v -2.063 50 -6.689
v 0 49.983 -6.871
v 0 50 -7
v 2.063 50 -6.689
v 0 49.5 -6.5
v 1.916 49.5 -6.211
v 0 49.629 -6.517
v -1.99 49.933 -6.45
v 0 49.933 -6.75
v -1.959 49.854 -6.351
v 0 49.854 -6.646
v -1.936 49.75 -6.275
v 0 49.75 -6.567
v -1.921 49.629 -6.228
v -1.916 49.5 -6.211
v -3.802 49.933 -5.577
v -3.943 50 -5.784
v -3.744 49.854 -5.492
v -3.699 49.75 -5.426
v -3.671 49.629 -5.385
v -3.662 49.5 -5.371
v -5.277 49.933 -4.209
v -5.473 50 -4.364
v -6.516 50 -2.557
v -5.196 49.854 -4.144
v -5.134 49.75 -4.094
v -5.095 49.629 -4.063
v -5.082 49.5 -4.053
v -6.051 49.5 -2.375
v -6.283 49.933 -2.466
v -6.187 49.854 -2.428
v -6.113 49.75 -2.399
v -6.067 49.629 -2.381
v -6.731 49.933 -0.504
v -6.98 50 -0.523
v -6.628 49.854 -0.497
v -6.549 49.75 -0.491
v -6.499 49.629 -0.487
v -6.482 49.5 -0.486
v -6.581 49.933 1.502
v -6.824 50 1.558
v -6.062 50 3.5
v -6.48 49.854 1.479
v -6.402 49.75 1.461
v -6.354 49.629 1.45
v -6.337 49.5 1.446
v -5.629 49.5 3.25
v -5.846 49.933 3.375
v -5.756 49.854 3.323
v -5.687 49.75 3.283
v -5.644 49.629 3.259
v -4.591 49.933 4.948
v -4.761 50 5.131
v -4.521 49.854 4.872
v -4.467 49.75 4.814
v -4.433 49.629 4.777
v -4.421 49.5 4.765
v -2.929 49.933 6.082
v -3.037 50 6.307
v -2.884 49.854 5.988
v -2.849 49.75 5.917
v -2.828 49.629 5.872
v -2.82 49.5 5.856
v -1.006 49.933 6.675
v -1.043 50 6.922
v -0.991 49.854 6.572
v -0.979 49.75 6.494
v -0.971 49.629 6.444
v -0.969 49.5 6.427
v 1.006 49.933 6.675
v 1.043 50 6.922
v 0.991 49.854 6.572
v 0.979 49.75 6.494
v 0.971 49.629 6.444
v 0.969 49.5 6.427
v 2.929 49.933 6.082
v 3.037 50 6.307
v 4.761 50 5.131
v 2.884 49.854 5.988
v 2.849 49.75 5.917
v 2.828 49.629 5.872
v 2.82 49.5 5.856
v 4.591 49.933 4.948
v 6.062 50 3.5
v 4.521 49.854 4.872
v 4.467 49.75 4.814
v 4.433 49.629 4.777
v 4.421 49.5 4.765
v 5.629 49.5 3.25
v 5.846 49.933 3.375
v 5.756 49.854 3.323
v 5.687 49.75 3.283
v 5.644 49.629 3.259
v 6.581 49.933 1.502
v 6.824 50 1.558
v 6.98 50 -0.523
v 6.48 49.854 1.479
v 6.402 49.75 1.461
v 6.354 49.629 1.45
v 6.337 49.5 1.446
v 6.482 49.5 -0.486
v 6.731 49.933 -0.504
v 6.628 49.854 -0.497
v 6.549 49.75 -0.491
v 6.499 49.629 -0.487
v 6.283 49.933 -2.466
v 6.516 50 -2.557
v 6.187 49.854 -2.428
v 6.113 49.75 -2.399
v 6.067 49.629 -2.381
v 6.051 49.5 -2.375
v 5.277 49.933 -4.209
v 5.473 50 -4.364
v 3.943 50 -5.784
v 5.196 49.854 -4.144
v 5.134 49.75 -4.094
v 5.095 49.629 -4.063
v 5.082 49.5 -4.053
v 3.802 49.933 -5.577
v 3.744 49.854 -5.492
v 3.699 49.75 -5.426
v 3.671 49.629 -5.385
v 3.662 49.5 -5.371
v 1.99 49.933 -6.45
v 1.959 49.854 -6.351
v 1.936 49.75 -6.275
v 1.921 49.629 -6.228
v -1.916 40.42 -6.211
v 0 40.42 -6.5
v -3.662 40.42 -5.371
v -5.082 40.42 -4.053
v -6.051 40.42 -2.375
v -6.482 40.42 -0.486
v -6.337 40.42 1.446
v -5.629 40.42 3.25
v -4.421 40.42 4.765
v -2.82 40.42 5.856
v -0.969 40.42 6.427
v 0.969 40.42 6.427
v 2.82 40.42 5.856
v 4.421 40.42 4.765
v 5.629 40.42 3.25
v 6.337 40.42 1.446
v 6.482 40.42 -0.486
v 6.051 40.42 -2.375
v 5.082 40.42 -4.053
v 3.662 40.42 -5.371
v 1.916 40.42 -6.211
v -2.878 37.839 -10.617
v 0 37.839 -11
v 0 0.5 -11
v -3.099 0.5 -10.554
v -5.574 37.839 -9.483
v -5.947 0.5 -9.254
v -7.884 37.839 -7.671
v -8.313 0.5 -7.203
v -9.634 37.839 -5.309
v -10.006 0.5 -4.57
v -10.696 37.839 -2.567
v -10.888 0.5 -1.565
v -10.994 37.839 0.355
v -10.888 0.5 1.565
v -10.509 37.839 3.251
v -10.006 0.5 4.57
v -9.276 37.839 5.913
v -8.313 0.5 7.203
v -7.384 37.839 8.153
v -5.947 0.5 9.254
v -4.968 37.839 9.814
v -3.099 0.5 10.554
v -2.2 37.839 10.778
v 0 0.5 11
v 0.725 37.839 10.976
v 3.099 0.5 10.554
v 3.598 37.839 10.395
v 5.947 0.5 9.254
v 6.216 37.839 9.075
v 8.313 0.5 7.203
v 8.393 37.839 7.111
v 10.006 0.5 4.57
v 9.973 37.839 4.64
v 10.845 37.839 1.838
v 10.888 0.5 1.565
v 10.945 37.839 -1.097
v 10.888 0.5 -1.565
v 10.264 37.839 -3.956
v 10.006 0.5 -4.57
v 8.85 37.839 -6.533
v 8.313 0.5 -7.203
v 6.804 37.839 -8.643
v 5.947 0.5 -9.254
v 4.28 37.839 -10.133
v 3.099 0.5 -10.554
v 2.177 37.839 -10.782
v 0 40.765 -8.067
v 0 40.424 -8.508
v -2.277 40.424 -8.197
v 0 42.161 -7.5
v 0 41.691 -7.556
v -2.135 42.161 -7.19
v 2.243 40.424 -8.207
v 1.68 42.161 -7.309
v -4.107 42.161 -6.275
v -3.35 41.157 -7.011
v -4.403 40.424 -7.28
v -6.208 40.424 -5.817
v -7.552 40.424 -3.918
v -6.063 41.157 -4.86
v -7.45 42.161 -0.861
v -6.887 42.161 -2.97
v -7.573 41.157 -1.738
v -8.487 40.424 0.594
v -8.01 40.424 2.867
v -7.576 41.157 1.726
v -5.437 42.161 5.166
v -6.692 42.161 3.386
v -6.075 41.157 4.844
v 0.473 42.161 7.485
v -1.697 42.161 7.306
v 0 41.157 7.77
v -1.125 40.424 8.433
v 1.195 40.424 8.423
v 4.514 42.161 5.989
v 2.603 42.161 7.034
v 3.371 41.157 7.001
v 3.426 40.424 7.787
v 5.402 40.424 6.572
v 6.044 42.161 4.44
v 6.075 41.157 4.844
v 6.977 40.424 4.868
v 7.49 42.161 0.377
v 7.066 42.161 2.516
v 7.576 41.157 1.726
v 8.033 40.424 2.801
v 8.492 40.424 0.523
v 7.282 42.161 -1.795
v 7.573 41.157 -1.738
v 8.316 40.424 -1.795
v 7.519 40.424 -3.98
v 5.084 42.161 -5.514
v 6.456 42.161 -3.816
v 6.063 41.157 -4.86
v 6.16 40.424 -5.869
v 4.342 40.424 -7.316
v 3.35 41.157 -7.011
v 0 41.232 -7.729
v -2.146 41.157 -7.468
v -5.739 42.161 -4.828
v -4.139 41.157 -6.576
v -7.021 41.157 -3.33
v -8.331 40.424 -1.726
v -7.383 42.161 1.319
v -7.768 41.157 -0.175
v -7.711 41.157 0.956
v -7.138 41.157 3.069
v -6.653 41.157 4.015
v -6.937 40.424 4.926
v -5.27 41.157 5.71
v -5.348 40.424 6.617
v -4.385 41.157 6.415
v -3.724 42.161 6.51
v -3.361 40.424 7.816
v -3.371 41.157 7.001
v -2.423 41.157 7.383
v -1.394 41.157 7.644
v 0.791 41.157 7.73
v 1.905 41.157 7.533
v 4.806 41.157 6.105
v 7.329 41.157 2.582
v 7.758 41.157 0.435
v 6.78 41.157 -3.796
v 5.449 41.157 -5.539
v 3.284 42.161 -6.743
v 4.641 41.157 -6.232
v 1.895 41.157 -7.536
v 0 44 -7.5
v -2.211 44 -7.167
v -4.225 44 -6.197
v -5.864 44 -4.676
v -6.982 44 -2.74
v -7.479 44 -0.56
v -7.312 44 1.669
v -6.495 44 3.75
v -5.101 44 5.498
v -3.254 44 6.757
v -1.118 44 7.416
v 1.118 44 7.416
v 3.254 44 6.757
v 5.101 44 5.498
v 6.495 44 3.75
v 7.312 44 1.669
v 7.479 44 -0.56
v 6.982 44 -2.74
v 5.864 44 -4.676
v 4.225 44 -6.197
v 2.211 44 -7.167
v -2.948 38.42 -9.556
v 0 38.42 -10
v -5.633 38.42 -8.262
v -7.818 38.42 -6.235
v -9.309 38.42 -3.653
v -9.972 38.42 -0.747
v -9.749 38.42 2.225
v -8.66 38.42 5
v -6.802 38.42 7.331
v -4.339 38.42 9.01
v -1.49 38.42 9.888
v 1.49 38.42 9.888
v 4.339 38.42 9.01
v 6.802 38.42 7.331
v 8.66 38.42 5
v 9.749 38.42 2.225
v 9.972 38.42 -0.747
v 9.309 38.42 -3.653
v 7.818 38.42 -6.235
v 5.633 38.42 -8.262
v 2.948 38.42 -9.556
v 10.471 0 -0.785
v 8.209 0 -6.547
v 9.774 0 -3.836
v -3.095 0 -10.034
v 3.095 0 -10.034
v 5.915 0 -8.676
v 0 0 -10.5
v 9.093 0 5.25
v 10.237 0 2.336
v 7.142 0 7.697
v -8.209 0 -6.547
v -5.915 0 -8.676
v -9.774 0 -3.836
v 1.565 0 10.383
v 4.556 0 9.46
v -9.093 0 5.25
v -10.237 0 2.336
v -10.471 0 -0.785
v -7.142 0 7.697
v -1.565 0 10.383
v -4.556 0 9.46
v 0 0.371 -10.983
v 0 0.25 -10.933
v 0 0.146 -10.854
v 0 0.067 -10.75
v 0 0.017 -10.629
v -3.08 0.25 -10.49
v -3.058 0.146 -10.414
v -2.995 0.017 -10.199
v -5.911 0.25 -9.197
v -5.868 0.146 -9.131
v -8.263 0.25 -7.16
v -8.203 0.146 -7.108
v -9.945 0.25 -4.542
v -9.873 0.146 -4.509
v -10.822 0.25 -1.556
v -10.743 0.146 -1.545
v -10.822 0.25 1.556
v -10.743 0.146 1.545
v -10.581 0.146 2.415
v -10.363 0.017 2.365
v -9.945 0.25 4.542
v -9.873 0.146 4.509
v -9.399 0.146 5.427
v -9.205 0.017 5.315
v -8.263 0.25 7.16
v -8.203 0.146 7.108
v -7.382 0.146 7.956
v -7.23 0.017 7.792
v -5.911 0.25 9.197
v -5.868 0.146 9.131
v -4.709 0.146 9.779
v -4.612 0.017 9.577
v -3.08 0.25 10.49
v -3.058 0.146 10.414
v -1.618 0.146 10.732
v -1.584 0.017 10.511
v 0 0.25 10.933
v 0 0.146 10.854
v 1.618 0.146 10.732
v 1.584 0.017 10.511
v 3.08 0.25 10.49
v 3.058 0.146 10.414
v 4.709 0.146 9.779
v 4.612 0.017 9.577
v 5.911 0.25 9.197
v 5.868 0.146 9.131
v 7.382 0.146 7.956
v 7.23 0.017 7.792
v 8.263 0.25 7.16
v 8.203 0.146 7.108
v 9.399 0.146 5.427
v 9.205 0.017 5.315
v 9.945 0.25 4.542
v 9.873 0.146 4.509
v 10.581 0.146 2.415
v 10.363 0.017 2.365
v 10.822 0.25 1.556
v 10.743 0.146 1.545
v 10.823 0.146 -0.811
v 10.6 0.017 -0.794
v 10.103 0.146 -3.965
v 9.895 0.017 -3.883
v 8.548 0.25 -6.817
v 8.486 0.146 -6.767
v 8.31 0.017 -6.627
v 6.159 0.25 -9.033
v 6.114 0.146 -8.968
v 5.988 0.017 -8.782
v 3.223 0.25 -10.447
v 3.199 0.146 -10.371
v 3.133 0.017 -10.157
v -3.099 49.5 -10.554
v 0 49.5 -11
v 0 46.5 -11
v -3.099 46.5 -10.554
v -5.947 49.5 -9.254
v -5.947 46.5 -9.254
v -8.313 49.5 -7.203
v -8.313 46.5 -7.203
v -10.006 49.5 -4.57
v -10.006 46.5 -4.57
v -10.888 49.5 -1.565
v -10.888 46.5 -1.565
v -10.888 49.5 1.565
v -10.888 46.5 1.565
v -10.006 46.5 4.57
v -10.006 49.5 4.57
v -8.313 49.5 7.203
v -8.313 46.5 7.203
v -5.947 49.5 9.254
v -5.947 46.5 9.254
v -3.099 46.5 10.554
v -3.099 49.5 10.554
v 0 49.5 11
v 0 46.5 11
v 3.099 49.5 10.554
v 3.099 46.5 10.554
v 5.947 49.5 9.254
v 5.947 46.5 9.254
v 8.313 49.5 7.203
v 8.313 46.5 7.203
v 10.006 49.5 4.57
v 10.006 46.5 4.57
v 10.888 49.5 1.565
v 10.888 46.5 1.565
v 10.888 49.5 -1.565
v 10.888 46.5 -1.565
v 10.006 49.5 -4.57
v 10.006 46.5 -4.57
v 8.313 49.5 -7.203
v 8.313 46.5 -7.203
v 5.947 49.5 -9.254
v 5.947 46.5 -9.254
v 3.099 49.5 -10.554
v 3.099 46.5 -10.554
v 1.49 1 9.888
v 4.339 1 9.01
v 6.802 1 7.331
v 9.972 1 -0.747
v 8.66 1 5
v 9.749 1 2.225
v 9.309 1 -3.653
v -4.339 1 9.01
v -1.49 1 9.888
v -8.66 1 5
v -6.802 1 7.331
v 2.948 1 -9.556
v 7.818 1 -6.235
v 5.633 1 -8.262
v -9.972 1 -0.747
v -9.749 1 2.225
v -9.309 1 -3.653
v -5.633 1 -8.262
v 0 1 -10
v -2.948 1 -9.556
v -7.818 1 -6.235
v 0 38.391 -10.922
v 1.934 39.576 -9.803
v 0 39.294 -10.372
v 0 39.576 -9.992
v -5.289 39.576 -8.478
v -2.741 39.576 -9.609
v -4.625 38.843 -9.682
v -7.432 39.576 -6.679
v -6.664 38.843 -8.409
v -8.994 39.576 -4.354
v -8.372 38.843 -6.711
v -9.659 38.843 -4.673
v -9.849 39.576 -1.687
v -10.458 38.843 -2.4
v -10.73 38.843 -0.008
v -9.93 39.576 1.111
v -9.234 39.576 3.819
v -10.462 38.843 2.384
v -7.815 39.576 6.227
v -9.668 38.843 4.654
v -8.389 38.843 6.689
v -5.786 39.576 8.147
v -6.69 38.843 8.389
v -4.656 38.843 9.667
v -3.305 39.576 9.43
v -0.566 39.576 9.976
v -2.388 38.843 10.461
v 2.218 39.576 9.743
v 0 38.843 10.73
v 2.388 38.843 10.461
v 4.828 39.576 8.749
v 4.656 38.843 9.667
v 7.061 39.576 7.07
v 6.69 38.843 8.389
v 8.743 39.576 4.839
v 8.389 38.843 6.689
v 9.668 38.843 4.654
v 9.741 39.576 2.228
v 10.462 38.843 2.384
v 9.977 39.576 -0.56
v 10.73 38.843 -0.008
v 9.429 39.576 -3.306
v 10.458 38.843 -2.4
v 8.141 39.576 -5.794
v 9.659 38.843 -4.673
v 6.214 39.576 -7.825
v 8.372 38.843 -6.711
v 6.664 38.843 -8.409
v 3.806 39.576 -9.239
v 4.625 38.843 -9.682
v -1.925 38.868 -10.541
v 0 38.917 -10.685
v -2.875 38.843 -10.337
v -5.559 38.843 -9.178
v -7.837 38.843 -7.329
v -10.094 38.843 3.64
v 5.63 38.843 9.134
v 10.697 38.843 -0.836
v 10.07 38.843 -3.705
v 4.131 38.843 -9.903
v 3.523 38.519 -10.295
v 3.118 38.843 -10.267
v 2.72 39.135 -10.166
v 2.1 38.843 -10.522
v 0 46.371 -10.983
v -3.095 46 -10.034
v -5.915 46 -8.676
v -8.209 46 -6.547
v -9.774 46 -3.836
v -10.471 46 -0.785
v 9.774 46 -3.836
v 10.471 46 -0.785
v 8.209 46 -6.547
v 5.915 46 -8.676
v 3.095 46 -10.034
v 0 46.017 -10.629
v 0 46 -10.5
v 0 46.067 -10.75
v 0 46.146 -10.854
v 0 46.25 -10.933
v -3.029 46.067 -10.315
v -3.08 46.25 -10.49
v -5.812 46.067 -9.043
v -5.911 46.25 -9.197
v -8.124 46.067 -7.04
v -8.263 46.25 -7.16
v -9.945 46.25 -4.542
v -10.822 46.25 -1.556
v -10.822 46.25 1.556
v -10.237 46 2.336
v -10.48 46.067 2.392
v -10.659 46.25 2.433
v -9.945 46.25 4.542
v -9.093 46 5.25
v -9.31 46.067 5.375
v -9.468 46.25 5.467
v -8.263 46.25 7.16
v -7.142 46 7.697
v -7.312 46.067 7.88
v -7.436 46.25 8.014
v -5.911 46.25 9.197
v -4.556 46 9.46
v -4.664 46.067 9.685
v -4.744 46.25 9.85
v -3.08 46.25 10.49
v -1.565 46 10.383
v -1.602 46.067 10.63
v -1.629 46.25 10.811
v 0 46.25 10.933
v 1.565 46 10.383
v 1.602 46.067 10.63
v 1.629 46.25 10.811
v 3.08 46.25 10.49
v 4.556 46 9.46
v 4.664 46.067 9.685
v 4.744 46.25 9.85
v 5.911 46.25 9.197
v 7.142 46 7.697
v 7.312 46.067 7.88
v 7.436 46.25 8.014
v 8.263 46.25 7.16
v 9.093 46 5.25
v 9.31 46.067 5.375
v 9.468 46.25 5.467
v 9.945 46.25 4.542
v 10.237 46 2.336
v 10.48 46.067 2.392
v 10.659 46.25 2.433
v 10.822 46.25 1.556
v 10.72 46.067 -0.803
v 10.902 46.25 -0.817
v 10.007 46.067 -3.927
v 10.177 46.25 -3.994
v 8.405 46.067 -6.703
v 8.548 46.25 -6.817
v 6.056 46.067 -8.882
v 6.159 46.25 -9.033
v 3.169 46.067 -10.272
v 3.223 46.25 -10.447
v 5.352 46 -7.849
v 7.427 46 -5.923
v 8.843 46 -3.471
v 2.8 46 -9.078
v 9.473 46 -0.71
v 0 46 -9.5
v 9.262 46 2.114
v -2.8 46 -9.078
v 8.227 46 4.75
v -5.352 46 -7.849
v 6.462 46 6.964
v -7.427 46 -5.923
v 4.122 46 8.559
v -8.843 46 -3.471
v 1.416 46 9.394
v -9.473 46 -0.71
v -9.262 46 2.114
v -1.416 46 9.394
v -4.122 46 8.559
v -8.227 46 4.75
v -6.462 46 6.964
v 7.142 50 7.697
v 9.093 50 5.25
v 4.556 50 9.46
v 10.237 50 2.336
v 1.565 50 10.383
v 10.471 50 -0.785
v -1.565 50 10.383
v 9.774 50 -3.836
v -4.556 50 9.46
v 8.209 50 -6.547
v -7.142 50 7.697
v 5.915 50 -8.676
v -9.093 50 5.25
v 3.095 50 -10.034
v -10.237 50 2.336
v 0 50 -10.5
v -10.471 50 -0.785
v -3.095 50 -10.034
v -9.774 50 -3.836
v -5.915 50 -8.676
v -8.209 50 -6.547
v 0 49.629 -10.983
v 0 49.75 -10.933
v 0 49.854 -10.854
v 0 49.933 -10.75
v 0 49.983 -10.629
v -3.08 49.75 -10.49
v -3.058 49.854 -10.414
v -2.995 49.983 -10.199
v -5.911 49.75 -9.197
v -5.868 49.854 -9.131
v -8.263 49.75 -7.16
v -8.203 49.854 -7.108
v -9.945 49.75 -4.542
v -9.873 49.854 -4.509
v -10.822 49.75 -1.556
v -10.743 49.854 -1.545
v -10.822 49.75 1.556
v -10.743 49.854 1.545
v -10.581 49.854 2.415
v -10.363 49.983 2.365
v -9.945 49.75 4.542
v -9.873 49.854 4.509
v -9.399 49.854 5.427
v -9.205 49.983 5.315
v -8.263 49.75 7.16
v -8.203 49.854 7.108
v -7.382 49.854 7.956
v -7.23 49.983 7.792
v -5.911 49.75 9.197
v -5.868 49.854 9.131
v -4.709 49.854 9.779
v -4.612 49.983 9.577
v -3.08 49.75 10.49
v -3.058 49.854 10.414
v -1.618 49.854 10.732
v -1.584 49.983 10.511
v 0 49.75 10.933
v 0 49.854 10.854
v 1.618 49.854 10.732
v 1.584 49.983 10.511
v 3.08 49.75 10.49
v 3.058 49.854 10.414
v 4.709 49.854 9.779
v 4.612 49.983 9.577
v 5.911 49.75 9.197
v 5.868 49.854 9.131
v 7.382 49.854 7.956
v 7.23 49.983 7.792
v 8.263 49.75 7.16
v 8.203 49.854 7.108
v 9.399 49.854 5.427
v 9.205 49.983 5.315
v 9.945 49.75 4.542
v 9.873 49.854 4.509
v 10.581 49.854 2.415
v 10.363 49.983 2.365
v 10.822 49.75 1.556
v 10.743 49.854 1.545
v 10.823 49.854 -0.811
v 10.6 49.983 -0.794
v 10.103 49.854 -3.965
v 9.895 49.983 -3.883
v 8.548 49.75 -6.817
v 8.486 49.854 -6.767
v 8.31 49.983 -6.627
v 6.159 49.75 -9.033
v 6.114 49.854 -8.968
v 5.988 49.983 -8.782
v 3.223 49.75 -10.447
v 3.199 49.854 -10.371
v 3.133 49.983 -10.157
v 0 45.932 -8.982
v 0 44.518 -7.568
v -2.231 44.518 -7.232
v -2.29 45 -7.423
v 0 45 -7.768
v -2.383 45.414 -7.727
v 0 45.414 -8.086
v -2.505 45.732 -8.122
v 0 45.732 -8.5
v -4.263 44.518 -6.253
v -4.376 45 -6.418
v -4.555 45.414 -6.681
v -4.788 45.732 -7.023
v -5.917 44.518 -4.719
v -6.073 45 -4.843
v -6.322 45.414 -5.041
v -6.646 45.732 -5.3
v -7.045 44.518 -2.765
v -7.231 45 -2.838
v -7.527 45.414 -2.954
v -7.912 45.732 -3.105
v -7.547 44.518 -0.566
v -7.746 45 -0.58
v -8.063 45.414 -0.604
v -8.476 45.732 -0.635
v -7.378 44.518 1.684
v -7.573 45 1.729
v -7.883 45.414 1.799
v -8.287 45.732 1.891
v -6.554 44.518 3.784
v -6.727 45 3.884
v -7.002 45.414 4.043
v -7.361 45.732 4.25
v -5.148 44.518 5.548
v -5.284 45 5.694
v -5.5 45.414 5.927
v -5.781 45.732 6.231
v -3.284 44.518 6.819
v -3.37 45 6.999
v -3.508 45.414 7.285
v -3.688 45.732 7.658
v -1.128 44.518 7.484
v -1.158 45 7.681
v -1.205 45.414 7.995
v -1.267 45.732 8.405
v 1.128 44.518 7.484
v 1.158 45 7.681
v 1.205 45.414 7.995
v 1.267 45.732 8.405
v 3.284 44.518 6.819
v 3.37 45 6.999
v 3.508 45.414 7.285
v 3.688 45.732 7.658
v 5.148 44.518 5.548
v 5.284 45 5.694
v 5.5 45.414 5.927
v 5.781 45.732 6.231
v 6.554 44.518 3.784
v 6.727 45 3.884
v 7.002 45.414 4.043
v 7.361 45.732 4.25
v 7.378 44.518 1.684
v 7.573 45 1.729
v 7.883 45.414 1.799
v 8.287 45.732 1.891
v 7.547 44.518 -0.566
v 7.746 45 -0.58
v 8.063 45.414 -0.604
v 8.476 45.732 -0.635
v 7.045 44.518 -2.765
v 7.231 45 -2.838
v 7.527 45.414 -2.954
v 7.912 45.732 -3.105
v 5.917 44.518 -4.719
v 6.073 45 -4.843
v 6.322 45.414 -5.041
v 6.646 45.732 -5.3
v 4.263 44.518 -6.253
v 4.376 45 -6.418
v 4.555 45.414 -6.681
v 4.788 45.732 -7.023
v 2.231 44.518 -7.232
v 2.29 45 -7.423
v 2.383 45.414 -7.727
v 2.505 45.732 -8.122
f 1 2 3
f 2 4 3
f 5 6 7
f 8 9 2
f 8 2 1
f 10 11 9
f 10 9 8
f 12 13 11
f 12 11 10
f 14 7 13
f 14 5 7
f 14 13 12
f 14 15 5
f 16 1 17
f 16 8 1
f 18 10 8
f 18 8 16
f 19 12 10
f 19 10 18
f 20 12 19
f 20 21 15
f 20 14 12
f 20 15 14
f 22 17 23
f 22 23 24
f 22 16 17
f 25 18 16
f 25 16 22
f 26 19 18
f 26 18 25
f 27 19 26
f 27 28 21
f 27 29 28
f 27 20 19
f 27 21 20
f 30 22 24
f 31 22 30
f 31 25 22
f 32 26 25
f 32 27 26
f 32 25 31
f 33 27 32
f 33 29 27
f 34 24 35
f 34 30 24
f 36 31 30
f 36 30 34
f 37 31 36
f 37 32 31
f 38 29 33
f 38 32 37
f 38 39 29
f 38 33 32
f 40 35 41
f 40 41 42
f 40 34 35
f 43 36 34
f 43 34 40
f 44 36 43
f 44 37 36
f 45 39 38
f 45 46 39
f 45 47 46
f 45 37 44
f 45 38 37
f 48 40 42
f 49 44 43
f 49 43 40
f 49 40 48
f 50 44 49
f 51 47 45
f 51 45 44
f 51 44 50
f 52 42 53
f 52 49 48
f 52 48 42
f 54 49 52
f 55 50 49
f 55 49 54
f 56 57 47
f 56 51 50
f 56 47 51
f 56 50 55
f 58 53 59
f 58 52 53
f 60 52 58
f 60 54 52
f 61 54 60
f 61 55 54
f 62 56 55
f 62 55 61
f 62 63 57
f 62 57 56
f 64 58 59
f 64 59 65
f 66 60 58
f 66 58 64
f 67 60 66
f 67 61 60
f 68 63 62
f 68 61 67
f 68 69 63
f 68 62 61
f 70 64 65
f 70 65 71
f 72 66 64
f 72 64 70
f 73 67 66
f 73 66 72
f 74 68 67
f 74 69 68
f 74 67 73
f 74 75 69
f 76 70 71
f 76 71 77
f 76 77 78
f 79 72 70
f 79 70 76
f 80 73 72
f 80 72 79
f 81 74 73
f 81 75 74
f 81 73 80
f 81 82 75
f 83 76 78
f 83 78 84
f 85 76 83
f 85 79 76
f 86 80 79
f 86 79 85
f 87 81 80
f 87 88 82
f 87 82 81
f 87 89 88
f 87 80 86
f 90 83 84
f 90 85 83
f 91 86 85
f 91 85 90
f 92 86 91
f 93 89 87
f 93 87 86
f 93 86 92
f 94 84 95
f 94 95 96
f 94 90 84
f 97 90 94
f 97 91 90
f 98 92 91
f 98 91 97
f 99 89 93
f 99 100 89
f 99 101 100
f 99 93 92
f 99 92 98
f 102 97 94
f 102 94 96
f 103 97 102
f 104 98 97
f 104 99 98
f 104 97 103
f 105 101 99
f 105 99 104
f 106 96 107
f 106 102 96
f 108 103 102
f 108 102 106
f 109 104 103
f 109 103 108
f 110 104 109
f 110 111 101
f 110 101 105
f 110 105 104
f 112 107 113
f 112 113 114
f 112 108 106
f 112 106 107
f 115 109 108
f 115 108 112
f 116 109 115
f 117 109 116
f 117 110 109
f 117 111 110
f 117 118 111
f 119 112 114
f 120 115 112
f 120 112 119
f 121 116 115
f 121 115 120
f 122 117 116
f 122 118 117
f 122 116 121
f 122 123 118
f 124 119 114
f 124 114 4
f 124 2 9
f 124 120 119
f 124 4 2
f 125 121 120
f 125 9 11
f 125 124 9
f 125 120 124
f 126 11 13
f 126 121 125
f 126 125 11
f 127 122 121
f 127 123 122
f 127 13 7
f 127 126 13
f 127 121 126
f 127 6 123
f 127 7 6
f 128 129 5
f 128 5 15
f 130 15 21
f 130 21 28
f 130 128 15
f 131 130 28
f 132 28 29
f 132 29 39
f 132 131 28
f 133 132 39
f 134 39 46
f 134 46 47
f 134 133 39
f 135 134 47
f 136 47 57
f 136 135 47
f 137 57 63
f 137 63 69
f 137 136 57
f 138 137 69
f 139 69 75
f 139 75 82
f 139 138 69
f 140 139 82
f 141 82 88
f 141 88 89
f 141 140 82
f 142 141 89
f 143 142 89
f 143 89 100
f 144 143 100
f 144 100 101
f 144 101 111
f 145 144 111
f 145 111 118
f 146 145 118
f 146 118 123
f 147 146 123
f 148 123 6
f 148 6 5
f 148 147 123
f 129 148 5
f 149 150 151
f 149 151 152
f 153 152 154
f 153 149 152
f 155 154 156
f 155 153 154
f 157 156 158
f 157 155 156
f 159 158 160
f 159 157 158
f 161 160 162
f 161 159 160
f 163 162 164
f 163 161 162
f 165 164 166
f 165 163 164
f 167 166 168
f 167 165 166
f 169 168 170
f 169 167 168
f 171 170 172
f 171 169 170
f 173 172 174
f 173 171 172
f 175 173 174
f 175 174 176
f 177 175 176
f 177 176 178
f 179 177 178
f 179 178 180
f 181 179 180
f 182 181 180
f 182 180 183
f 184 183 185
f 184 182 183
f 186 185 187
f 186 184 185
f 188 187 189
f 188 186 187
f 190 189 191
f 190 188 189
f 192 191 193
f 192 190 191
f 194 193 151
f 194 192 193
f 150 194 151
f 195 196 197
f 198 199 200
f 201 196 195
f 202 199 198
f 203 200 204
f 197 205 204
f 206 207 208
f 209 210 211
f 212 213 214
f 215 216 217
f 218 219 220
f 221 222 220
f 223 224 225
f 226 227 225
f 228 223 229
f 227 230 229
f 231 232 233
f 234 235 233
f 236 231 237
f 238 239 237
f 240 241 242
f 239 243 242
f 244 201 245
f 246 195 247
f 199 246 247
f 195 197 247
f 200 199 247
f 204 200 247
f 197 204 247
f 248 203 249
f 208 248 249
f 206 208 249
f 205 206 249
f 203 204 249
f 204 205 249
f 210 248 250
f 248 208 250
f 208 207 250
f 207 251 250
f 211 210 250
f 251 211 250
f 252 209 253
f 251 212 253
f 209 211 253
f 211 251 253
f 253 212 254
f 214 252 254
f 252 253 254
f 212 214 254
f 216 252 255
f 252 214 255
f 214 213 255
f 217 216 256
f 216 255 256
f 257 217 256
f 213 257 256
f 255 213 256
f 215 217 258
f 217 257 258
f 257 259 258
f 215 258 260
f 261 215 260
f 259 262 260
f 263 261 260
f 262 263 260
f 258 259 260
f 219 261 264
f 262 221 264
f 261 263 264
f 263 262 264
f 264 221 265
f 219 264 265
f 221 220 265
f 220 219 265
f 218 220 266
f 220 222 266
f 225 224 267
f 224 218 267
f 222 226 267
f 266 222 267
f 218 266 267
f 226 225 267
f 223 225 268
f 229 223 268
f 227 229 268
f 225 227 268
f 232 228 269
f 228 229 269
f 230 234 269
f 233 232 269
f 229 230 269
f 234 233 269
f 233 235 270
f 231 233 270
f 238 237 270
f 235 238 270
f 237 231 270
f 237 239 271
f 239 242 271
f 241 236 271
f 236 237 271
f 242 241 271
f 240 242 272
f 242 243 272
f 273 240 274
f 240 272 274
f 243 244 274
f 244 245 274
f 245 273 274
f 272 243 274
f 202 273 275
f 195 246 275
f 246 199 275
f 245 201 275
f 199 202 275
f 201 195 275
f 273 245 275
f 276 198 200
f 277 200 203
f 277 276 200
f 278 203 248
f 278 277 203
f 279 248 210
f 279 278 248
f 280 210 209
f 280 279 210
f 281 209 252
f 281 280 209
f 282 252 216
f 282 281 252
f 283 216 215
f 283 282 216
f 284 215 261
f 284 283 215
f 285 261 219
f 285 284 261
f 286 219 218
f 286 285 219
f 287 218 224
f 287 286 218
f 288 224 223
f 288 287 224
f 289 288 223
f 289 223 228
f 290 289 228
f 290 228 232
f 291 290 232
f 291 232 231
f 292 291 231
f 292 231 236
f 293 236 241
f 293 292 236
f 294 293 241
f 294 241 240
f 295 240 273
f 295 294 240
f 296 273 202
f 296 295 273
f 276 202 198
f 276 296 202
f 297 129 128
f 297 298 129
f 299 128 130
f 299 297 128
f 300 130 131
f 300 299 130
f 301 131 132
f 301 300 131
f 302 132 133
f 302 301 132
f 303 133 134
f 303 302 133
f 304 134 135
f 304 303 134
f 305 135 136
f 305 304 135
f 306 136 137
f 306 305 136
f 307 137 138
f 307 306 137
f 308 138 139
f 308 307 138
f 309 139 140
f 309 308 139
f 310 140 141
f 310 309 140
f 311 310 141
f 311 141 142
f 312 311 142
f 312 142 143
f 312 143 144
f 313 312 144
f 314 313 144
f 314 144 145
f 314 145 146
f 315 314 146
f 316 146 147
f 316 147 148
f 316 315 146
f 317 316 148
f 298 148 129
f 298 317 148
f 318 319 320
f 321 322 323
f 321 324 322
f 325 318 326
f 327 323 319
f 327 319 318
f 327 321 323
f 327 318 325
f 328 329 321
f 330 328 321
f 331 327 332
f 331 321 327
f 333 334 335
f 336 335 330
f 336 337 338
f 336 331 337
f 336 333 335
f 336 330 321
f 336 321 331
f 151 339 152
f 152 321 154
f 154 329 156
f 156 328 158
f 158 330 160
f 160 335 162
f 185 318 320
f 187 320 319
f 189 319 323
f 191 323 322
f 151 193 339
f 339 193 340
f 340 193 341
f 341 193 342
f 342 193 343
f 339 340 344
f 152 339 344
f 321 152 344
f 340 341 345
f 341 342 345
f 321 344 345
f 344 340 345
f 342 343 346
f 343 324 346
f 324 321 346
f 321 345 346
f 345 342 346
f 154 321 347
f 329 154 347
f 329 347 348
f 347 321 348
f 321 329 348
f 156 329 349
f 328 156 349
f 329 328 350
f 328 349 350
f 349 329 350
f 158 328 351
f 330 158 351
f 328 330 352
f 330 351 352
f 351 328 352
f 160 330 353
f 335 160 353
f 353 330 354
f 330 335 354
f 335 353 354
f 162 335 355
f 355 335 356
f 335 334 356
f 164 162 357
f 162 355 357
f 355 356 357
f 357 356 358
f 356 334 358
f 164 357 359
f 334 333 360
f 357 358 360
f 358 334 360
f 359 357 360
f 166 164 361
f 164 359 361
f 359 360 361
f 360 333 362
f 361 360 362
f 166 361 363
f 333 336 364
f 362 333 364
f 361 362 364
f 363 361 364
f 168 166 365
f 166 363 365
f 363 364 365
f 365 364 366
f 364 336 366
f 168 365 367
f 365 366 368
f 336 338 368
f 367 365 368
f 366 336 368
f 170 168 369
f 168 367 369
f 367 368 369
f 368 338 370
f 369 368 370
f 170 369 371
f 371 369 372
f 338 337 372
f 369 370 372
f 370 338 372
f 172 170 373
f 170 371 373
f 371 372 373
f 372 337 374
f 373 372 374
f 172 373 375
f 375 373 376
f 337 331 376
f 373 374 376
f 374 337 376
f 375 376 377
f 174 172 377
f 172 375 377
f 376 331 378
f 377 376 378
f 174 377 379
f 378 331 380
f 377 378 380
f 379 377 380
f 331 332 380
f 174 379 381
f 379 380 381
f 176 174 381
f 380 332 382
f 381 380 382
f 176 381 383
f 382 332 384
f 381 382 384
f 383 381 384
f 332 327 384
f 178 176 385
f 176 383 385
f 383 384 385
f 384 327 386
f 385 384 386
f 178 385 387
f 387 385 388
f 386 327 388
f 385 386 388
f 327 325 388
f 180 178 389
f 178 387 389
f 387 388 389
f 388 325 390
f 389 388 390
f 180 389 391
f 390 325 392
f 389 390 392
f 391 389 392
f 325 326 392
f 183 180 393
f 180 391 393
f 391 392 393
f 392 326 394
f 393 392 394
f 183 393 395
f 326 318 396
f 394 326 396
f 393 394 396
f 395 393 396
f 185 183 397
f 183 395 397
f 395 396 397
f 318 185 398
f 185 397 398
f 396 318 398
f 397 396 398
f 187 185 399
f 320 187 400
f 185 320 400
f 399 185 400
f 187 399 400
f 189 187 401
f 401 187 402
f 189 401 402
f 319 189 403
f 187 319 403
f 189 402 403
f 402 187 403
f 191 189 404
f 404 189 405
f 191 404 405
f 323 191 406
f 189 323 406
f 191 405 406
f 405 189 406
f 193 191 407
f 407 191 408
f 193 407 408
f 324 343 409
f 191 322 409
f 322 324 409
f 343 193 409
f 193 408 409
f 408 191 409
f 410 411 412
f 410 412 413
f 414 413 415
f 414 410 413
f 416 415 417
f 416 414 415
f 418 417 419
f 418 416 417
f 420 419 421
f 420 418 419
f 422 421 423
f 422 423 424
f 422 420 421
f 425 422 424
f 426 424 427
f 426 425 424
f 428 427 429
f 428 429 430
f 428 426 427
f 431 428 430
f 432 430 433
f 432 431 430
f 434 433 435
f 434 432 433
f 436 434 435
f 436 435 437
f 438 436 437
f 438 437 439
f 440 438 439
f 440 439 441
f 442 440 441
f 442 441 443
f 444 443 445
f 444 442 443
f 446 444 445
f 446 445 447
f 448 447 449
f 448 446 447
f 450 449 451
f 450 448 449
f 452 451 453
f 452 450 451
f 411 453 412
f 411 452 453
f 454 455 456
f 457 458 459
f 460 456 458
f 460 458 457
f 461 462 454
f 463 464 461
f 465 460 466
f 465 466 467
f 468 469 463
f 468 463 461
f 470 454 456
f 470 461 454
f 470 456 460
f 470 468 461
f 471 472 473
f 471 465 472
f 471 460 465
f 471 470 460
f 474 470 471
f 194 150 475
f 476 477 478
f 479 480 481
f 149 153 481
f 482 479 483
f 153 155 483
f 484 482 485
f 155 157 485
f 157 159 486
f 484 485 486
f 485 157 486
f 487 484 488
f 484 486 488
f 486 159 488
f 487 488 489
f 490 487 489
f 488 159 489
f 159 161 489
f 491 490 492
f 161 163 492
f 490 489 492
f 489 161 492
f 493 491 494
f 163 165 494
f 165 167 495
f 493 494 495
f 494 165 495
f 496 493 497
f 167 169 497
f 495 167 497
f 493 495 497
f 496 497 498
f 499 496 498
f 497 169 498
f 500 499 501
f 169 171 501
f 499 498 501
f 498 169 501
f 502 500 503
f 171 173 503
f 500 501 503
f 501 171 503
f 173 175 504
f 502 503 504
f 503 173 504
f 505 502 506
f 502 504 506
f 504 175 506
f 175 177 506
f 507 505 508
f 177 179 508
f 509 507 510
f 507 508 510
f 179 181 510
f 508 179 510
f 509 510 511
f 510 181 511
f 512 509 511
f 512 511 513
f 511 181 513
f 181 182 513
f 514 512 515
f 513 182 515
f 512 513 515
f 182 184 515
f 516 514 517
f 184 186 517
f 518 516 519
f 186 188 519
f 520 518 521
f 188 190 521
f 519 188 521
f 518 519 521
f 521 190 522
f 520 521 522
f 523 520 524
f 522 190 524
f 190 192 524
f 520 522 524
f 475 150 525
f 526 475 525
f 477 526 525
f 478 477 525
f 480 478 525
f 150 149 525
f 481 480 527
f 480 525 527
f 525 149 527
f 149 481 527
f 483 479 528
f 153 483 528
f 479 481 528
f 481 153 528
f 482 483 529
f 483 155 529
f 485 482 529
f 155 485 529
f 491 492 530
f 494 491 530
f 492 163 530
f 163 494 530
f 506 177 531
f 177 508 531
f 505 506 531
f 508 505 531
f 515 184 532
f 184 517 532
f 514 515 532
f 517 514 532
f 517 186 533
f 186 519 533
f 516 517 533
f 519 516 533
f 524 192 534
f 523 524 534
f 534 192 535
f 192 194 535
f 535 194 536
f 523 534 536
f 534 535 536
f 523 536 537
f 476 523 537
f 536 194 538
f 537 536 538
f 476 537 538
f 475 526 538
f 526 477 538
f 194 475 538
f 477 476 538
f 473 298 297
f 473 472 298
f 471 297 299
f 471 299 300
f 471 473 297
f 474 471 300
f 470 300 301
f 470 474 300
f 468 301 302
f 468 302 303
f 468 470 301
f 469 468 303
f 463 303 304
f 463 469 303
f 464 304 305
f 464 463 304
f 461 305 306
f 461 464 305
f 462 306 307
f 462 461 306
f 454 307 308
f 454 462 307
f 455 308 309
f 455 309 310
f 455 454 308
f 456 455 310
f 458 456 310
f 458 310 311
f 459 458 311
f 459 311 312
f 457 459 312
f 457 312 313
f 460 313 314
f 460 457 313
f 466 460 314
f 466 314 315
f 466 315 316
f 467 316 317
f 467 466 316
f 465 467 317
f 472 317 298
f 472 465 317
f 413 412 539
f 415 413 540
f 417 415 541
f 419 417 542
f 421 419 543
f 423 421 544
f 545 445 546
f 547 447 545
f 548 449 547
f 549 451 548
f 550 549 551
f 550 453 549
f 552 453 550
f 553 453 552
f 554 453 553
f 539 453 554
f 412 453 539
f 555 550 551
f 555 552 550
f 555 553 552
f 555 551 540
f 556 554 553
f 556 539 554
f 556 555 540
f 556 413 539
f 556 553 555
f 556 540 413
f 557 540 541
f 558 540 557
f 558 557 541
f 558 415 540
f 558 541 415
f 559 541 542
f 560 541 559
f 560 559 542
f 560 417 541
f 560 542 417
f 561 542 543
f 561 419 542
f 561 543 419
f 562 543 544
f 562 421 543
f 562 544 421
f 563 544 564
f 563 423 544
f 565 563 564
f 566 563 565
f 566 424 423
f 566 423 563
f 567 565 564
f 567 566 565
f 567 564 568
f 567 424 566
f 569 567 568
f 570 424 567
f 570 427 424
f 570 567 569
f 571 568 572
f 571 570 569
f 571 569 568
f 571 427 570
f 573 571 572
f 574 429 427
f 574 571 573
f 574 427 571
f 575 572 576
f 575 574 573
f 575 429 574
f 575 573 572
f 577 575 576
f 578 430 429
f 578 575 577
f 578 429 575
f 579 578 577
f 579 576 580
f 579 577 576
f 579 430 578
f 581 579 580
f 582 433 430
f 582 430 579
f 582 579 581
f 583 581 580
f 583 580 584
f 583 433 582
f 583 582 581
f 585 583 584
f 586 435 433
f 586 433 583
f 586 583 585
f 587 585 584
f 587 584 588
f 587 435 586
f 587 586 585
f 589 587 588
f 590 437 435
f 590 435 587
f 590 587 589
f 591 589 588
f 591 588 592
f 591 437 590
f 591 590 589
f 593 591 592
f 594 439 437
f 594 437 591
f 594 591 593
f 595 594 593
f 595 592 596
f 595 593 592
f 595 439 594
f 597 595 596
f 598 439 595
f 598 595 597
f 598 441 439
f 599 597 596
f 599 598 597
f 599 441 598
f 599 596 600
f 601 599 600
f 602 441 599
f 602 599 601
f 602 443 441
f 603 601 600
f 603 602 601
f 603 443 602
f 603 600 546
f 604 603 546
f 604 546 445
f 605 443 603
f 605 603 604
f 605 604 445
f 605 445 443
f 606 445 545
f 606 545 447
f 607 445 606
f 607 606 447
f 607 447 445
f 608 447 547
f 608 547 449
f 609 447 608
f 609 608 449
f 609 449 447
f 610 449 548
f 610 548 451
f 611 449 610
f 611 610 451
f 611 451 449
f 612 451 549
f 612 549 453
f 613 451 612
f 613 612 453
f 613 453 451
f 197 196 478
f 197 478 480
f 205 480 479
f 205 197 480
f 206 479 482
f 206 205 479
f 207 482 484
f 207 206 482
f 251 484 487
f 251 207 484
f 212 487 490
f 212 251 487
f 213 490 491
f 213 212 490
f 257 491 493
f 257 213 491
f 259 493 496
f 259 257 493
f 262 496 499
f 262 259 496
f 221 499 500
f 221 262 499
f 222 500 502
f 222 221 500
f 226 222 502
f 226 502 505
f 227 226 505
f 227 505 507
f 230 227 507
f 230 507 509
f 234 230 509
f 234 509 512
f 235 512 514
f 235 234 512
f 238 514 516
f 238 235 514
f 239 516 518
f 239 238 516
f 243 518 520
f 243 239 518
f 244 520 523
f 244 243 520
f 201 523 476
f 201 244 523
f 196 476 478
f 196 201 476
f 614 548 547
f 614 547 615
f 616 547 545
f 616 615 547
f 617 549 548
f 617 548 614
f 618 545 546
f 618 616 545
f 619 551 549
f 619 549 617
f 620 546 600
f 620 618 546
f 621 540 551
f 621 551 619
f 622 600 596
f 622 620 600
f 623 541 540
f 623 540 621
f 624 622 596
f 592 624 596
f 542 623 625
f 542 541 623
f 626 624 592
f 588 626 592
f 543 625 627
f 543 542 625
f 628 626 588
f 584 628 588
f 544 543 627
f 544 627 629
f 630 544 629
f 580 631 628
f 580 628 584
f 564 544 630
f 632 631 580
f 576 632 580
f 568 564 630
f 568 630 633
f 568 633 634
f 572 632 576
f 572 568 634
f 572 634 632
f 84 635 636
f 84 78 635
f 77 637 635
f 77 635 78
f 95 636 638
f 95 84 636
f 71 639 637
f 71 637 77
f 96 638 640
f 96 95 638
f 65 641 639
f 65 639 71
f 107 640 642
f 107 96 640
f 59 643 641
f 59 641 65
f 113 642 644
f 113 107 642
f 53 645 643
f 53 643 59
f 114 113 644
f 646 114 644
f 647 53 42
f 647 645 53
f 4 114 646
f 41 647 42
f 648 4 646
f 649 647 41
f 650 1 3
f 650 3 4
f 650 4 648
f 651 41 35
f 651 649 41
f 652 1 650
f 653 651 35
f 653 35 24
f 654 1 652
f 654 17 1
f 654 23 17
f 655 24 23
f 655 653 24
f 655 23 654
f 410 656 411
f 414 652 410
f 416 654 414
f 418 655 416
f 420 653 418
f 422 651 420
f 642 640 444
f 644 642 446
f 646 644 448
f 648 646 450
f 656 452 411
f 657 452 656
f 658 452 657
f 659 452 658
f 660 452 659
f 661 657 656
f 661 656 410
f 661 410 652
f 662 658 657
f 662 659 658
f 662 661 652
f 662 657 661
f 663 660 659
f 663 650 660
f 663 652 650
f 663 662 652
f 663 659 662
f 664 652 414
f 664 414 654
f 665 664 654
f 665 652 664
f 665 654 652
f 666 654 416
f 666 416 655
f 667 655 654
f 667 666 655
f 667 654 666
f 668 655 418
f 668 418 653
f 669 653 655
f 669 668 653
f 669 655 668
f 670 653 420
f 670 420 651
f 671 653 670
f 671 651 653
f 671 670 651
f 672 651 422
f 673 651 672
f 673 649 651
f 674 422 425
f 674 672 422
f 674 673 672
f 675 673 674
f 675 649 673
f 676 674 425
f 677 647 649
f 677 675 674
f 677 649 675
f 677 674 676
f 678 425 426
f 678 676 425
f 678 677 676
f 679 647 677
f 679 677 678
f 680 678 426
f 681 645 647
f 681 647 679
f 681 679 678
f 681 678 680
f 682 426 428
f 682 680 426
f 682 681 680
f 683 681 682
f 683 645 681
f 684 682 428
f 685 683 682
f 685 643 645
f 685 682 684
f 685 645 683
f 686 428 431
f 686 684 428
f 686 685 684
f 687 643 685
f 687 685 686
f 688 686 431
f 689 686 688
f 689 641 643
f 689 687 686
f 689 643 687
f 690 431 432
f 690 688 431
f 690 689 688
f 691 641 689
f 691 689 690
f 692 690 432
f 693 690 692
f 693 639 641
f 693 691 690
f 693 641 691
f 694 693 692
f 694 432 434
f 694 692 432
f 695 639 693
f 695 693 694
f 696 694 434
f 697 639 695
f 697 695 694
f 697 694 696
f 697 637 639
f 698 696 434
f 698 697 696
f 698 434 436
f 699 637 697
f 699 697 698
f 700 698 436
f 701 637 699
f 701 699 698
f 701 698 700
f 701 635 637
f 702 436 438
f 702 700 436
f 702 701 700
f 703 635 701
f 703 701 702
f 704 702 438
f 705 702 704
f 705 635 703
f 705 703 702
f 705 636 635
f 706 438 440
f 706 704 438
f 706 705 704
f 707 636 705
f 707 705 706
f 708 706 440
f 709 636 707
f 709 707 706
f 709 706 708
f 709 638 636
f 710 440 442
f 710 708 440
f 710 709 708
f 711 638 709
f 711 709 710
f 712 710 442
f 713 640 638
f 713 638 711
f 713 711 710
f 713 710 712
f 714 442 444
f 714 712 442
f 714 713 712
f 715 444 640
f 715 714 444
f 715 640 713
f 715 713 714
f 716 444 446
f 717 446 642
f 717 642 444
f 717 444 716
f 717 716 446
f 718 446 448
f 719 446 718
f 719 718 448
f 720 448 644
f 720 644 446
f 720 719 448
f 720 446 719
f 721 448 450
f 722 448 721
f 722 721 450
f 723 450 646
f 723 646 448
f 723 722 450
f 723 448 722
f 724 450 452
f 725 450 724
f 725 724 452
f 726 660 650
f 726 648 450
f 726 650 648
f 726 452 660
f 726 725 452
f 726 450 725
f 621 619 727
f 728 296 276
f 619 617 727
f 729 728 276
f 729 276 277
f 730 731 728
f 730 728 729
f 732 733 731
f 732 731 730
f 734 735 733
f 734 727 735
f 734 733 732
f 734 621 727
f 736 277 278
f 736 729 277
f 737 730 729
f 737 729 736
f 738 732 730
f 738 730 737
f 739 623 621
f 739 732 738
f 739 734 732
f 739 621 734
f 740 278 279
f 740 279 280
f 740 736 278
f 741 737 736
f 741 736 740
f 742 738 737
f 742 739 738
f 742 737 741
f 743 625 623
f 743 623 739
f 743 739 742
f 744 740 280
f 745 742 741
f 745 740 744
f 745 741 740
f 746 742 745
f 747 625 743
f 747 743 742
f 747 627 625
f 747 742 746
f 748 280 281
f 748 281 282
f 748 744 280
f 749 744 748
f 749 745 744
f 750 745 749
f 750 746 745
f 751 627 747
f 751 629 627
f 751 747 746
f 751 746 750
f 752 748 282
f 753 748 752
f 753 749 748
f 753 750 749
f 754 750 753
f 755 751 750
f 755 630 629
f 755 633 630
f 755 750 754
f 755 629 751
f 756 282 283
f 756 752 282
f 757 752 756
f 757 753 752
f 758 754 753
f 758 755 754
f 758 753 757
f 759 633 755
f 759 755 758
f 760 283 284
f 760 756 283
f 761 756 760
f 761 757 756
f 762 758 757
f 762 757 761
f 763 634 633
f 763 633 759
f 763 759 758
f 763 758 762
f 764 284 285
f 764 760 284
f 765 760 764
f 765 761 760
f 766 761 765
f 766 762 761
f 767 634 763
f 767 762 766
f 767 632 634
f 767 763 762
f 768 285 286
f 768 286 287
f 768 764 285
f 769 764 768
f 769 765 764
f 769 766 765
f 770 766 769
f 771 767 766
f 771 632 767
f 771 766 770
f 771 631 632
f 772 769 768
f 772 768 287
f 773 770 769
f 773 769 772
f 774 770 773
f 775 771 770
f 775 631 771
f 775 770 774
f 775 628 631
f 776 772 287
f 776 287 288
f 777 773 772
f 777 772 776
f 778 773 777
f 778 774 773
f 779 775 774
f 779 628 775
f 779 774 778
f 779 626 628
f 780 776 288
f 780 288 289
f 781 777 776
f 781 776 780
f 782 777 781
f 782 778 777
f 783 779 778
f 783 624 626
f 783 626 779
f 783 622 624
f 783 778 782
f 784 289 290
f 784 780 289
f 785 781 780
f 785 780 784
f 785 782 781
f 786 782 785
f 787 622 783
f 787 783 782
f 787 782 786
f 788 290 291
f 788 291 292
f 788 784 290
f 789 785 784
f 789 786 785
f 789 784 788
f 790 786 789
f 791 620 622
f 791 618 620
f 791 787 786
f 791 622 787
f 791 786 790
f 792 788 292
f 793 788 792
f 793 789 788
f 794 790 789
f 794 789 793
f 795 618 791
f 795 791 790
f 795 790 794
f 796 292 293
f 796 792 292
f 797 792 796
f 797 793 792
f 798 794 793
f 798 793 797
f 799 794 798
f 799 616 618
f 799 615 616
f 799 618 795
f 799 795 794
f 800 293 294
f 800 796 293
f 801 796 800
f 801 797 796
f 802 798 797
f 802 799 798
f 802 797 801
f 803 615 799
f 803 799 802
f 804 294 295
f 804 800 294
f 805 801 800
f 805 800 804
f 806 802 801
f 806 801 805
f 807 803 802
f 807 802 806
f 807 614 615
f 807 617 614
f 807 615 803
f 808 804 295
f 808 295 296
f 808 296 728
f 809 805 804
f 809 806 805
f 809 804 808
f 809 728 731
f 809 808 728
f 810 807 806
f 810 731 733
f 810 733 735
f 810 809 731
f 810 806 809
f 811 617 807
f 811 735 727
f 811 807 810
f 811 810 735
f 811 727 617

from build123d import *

# Parameters (mm, degrees)
FILLET1_R = 2
FILLET2_R = 0.5


with BuildPart() as part:
    # Sketch1 → Revolve1 (revolve)
    with BuildSketch(Plane.XY, mode=Mode.PRIVATE) as revolve1_sk:
        Polygon((0, 0), (11, 0), (11, 39), (7.5, 41), (7.5, 46), (11, 46), (11, 50), (6.5, 50), (6.5, 40.419677465), (10, 38.419677465), (10, 1), (0, 1), align=None)
    revolve(revolve1_sk.sketch.rotate(Axis((0, 0, 0), (0, 1, 0)), 90), axis=Axis((0, 0, 0), (0, 1, 0)))

    # Fillet1
    fillet1_edges = [part.edges().sort_by_distance(p)[0] for p in [
        (0, 46, 7.5),
        (0, 41, 7.5),
        (0, 39, 11),
    ]]
    fillet(fillet1_edges, radius=FILLET1_R)

    # Fillet2
    fillet2_edges = [part.edges().sort_by_distance(p)[0] for p in [
        (0, 50, 6.5),
        (0, 50, 11),
        (0, 46, 11),
        (0, 0, 11),
    ]]
    fillet(fillet2_edges, radius=FILLET2_R)


solid = part.part
